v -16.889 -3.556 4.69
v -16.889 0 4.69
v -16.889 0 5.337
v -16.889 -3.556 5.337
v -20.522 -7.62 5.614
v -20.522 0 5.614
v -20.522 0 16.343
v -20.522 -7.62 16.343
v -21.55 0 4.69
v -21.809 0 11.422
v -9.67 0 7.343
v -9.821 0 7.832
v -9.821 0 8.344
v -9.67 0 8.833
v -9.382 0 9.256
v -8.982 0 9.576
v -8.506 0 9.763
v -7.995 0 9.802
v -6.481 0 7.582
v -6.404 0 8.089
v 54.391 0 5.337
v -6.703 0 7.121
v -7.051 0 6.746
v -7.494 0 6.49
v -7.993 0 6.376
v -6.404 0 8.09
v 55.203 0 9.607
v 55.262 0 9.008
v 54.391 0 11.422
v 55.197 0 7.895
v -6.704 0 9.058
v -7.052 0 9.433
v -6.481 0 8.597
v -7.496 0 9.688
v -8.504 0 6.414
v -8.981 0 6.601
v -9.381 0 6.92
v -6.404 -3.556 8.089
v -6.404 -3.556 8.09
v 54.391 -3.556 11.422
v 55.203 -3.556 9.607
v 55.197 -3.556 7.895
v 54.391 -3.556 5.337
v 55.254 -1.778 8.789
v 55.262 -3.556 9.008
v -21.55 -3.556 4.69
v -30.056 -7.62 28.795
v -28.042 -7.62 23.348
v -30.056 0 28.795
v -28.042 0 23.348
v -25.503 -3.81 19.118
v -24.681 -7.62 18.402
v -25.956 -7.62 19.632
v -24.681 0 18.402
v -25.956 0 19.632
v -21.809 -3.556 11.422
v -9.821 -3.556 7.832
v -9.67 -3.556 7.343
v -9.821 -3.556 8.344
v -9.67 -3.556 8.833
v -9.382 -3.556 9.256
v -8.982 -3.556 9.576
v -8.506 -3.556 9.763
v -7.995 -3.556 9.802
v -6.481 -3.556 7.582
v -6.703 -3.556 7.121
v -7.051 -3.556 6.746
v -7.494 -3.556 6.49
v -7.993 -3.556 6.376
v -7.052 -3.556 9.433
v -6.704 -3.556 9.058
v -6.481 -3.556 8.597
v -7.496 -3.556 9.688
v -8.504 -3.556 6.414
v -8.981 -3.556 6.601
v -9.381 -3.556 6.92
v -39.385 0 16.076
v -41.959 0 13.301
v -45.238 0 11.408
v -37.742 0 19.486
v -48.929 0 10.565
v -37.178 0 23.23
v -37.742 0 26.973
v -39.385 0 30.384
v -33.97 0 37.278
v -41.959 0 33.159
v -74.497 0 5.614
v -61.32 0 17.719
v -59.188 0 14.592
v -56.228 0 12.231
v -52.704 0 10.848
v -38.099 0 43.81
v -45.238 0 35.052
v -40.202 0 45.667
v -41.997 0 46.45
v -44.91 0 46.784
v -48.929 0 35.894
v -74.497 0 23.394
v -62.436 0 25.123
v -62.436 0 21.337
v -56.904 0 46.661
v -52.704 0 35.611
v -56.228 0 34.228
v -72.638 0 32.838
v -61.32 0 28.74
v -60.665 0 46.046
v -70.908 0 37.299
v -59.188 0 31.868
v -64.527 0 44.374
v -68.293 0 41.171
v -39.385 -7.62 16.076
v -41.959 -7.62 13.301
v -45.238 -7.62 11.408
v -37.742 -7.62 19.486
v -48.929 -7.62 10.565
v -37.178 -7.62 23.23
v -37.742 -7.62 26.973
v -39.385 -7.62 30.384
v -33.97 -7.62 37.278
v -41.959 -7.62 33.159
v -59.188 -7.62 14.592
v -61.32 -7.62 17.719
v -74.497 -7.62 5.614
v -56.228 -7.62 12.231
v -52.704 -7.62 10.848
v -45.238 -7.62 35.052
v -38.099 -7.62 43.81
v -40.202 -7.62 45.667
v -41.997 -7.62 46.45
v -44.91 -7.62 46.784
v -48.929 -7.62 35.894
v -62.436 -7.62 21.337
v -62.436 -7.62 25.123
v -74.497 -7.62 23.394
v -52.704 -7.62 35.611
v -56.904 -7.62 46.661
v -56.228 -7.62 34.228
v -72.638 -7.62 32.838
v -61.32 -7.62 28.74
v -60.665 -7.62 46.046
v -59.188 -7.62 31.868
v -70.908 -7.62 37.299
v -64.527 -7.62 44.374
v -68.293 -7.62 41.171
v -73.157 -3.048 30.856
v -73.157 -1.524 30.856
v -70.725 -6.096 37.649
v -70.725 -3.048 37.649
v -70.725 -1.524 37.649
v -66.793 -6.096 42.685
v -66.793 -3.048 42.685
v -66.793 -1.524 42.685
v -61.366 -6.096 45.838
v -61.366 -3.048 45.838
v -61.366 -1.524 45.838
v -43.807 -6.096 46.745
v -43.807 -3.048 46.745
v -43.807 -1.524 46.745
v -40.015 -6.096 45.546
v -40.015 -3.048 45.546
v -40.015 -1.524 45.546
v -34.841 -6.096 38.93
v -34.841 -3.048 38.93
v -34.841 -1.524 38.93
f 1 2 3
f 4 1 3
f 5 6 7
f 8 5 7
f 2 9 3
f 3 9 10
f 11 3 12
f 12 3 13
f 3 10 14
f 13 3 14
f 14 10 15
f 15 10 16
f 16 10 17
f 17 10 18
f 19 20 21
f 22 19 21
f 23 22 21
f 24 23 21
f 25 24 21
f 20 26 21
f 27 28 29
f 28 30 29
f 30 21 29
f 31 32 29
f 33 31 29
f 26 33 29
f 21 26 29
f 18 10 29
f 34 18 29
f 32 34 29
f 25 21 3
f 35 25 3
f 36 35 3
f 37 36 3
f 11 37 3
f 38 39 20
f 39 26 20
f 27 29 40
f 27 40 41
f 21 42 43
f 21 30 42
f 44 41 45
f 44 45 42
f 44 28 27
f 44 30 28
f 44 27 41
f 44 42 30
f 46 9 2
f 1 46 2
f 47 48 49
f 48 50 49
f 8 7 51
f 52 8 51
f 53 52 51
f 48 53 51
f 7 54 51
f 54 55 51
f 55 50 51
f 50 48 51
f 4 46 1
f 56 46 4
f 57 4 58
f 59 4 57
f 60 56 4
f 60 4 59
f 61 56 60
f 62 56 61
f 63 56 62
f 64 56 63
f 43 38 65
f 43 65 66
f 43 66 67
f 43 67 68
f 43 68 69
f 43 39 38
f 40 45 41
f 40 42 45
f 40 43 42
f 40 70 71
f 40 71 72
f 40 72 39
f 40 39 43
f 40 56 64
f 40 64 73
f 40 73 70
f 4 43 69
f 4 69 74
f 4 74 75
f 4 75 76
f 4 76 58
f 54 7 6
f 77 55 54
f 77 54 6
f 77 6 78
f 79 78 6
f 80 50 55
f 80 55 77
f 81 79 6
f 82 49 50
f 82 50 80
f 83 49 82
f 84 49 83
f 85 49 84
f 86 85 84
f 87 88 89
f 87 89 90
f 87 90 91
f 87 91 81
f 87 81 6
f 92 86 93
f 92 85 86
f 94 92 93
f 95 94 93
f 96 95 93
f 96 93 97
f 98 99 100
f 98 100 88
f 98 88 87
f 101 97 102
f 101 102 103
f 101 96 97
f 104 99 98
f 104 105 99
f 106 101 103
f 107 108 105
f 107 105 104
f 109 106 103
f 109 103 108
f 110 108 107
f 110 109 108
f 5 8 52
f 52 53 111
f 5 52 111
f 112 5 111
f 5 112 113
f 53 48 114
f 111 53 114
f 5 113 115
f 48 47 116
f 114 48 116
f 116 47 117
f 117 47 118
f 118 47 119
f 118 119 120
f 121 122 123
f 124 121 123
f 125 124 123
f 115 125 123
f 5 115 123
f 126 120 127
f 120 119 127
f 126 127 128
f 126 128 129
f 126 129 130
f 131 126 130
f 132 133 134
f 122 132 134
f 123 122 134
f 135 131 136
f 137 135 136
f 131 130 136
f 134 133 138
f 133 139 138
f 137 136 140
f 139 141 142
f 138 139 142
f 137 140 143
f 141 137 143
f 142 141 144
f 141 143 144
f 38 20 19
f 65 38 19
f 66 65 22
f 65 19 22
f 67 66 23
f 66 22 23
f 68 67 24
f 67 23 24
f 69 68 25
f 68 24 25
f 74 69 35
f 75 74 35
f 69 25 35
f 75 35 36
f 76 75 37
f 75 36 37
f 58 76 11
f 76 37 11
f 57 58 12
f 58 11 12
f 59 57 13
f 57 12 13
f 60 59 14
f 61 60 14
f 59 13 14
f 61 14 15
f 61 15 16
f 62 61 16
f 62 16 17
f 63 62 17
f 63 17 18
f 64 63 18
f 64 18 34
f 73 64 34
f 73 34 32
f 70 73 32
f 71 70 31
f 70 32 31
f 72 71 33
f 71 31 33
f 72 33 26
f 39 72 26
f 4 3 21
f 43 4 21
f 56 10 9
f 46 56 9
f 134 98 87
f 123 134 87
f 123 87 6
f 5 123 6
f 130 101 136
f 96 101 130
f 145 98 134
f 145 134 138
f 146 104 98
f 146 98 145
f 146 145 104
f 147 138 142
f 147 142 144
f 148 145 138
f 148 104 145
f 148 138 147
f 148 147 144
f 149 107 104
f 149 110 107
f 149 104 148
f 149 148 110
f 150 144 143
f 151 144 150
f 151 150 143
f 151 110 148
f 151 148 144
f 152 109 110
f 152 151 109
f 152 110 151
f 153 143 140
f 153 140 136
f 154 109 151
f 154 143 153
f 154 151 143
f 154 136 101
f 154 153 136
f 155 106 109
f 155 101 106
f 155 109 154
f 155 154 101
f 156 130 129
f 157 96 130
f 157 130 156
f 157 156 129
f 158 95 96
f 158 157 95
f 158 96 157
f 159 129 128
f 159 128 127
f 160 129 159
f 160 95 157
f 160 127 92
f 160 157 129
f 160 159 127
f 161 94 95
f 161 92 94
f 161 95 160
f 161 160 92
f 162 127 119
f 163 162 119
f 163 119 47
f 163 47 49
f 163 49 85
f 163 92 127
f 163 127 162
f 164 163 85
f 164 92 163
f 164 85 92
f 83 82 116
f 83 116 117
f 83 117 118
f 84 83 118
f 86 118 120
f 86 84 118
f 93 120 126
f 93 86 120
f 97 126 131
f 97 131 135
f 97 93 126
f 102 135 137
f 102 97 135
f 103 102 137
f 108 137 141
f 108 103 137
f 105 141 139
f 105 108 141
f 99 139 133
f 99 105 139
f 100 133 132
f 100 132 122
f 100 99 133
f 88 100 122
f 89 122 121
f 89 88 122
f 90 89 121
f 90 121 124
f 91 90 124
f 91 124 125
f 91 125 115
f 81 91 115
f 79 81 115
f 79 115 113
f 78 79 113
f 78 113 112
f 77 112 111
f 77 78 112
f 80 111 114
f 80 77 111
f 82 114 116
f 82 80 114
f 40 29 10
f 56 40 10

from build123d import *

# Parameters (mm, degrees)
F0_R     = 12.7
F1_DEPTH = 7.62
F3_DEPTH = 3.556


with BuildPart() as f1:
    # F0 (on Front) → F1 (new body)
    with BuildSketch(Plane.XZ):
        with BuildLine():
            add(Edge.make_bspline(
                [(-74.4966706308, 23.3939551896), (-73.725104121, 28.4430054043), (-72.244939562, 38.1290469534), (-62.0317343333, 47.6868281028), (-48.3025596431, 46.2584201491), (-38.4002225235, 47.7473061021), (-33.2032280448, 35.9426258243), (-30.0564943739, 28.7949975267)],
                knots=[0, 0, 0, 0, 0.20995775, 0.4027806022, 0.601365718, 0.7586305081, 1, 1, 1, 1], degree=3))
            Line((-74.4966706308, 23.3939551896), (-74.4966706308, 5.6139551896))
            Line((-74.4966706308, 5.6139551896), (-20.5216706308, 5.6139551896))
            Line((-20.5216706308, 5.6139551896), (-20.5216706308, 16.3425861905))
            add(Edge.make_bspline(
                [(-20.5216706308, 16.3425861905), (-22.7866601061, 17.3728601759), (-26.2623209609, 18.4523294218), (-28.5189439618, 24.213320784), (-30.0564943739, 28.7949975267)],
                knots=[0, 0, 0, 0, 0.4220329549, 1, 1, 1, 1], degree=3))
        make_face()
        with Locations((-49.8777776957, 23.2298132032)):
            Circle(F0_R, mode=Mode.SUBTRACT)
    extrude(amount=F1_DEPTH)


with BuildPart() as f3:
    # F2 (on Front) → F3 (new body)
    with BuildSketch(Plane.XZ):
        with BuildLine():
            Line((54.3913766734, 11.4217040176), (-21.8086233266, 11.4217040176))
            Line((-21.8086233266, 11.4217040176), (-21.5496970244, 4.6896238822))
            Line((-21.5496970244, 4.6896238822), (-16.8890263789, 4.6896238822))
            Line((-16.8890263789, 4.6896238822), (-16.8890263789, 5.3372839447))
            Line((-16.8890263789, 5.3372839447), (54.3913766734, 5.3372839447))
            add(Edge.make_bspline(
                [(54.3913766734, 11.4217040176), (55.3620508614, 9.7132972958), (55.1649866176, 8.7868398988), (55.3183357371, 7.6061006687), (54.3913766734, 5.3372839447)],
                knots=[0, 0, 0, 0, 0.4687879891, 1, 1, 1, 1], degree=3))
        make_face()
        with BuildLine():
            ThreePointArc((-6.4042282244, 8.0904201991), (-6.4042275306, 8.089528772), (-6.4042272993, 8.0886373447))
            ThreePointArc((-6.4042272993, 8.0886373447), (-9.840110468, 8.0877459174), (-6.4042282244, 8.0904201991))
        make_face(mode=Mode.SUBTRACT)
    extrude(amount=F3_DEPTH)


solid = Compound([f1.part, f3.part])
